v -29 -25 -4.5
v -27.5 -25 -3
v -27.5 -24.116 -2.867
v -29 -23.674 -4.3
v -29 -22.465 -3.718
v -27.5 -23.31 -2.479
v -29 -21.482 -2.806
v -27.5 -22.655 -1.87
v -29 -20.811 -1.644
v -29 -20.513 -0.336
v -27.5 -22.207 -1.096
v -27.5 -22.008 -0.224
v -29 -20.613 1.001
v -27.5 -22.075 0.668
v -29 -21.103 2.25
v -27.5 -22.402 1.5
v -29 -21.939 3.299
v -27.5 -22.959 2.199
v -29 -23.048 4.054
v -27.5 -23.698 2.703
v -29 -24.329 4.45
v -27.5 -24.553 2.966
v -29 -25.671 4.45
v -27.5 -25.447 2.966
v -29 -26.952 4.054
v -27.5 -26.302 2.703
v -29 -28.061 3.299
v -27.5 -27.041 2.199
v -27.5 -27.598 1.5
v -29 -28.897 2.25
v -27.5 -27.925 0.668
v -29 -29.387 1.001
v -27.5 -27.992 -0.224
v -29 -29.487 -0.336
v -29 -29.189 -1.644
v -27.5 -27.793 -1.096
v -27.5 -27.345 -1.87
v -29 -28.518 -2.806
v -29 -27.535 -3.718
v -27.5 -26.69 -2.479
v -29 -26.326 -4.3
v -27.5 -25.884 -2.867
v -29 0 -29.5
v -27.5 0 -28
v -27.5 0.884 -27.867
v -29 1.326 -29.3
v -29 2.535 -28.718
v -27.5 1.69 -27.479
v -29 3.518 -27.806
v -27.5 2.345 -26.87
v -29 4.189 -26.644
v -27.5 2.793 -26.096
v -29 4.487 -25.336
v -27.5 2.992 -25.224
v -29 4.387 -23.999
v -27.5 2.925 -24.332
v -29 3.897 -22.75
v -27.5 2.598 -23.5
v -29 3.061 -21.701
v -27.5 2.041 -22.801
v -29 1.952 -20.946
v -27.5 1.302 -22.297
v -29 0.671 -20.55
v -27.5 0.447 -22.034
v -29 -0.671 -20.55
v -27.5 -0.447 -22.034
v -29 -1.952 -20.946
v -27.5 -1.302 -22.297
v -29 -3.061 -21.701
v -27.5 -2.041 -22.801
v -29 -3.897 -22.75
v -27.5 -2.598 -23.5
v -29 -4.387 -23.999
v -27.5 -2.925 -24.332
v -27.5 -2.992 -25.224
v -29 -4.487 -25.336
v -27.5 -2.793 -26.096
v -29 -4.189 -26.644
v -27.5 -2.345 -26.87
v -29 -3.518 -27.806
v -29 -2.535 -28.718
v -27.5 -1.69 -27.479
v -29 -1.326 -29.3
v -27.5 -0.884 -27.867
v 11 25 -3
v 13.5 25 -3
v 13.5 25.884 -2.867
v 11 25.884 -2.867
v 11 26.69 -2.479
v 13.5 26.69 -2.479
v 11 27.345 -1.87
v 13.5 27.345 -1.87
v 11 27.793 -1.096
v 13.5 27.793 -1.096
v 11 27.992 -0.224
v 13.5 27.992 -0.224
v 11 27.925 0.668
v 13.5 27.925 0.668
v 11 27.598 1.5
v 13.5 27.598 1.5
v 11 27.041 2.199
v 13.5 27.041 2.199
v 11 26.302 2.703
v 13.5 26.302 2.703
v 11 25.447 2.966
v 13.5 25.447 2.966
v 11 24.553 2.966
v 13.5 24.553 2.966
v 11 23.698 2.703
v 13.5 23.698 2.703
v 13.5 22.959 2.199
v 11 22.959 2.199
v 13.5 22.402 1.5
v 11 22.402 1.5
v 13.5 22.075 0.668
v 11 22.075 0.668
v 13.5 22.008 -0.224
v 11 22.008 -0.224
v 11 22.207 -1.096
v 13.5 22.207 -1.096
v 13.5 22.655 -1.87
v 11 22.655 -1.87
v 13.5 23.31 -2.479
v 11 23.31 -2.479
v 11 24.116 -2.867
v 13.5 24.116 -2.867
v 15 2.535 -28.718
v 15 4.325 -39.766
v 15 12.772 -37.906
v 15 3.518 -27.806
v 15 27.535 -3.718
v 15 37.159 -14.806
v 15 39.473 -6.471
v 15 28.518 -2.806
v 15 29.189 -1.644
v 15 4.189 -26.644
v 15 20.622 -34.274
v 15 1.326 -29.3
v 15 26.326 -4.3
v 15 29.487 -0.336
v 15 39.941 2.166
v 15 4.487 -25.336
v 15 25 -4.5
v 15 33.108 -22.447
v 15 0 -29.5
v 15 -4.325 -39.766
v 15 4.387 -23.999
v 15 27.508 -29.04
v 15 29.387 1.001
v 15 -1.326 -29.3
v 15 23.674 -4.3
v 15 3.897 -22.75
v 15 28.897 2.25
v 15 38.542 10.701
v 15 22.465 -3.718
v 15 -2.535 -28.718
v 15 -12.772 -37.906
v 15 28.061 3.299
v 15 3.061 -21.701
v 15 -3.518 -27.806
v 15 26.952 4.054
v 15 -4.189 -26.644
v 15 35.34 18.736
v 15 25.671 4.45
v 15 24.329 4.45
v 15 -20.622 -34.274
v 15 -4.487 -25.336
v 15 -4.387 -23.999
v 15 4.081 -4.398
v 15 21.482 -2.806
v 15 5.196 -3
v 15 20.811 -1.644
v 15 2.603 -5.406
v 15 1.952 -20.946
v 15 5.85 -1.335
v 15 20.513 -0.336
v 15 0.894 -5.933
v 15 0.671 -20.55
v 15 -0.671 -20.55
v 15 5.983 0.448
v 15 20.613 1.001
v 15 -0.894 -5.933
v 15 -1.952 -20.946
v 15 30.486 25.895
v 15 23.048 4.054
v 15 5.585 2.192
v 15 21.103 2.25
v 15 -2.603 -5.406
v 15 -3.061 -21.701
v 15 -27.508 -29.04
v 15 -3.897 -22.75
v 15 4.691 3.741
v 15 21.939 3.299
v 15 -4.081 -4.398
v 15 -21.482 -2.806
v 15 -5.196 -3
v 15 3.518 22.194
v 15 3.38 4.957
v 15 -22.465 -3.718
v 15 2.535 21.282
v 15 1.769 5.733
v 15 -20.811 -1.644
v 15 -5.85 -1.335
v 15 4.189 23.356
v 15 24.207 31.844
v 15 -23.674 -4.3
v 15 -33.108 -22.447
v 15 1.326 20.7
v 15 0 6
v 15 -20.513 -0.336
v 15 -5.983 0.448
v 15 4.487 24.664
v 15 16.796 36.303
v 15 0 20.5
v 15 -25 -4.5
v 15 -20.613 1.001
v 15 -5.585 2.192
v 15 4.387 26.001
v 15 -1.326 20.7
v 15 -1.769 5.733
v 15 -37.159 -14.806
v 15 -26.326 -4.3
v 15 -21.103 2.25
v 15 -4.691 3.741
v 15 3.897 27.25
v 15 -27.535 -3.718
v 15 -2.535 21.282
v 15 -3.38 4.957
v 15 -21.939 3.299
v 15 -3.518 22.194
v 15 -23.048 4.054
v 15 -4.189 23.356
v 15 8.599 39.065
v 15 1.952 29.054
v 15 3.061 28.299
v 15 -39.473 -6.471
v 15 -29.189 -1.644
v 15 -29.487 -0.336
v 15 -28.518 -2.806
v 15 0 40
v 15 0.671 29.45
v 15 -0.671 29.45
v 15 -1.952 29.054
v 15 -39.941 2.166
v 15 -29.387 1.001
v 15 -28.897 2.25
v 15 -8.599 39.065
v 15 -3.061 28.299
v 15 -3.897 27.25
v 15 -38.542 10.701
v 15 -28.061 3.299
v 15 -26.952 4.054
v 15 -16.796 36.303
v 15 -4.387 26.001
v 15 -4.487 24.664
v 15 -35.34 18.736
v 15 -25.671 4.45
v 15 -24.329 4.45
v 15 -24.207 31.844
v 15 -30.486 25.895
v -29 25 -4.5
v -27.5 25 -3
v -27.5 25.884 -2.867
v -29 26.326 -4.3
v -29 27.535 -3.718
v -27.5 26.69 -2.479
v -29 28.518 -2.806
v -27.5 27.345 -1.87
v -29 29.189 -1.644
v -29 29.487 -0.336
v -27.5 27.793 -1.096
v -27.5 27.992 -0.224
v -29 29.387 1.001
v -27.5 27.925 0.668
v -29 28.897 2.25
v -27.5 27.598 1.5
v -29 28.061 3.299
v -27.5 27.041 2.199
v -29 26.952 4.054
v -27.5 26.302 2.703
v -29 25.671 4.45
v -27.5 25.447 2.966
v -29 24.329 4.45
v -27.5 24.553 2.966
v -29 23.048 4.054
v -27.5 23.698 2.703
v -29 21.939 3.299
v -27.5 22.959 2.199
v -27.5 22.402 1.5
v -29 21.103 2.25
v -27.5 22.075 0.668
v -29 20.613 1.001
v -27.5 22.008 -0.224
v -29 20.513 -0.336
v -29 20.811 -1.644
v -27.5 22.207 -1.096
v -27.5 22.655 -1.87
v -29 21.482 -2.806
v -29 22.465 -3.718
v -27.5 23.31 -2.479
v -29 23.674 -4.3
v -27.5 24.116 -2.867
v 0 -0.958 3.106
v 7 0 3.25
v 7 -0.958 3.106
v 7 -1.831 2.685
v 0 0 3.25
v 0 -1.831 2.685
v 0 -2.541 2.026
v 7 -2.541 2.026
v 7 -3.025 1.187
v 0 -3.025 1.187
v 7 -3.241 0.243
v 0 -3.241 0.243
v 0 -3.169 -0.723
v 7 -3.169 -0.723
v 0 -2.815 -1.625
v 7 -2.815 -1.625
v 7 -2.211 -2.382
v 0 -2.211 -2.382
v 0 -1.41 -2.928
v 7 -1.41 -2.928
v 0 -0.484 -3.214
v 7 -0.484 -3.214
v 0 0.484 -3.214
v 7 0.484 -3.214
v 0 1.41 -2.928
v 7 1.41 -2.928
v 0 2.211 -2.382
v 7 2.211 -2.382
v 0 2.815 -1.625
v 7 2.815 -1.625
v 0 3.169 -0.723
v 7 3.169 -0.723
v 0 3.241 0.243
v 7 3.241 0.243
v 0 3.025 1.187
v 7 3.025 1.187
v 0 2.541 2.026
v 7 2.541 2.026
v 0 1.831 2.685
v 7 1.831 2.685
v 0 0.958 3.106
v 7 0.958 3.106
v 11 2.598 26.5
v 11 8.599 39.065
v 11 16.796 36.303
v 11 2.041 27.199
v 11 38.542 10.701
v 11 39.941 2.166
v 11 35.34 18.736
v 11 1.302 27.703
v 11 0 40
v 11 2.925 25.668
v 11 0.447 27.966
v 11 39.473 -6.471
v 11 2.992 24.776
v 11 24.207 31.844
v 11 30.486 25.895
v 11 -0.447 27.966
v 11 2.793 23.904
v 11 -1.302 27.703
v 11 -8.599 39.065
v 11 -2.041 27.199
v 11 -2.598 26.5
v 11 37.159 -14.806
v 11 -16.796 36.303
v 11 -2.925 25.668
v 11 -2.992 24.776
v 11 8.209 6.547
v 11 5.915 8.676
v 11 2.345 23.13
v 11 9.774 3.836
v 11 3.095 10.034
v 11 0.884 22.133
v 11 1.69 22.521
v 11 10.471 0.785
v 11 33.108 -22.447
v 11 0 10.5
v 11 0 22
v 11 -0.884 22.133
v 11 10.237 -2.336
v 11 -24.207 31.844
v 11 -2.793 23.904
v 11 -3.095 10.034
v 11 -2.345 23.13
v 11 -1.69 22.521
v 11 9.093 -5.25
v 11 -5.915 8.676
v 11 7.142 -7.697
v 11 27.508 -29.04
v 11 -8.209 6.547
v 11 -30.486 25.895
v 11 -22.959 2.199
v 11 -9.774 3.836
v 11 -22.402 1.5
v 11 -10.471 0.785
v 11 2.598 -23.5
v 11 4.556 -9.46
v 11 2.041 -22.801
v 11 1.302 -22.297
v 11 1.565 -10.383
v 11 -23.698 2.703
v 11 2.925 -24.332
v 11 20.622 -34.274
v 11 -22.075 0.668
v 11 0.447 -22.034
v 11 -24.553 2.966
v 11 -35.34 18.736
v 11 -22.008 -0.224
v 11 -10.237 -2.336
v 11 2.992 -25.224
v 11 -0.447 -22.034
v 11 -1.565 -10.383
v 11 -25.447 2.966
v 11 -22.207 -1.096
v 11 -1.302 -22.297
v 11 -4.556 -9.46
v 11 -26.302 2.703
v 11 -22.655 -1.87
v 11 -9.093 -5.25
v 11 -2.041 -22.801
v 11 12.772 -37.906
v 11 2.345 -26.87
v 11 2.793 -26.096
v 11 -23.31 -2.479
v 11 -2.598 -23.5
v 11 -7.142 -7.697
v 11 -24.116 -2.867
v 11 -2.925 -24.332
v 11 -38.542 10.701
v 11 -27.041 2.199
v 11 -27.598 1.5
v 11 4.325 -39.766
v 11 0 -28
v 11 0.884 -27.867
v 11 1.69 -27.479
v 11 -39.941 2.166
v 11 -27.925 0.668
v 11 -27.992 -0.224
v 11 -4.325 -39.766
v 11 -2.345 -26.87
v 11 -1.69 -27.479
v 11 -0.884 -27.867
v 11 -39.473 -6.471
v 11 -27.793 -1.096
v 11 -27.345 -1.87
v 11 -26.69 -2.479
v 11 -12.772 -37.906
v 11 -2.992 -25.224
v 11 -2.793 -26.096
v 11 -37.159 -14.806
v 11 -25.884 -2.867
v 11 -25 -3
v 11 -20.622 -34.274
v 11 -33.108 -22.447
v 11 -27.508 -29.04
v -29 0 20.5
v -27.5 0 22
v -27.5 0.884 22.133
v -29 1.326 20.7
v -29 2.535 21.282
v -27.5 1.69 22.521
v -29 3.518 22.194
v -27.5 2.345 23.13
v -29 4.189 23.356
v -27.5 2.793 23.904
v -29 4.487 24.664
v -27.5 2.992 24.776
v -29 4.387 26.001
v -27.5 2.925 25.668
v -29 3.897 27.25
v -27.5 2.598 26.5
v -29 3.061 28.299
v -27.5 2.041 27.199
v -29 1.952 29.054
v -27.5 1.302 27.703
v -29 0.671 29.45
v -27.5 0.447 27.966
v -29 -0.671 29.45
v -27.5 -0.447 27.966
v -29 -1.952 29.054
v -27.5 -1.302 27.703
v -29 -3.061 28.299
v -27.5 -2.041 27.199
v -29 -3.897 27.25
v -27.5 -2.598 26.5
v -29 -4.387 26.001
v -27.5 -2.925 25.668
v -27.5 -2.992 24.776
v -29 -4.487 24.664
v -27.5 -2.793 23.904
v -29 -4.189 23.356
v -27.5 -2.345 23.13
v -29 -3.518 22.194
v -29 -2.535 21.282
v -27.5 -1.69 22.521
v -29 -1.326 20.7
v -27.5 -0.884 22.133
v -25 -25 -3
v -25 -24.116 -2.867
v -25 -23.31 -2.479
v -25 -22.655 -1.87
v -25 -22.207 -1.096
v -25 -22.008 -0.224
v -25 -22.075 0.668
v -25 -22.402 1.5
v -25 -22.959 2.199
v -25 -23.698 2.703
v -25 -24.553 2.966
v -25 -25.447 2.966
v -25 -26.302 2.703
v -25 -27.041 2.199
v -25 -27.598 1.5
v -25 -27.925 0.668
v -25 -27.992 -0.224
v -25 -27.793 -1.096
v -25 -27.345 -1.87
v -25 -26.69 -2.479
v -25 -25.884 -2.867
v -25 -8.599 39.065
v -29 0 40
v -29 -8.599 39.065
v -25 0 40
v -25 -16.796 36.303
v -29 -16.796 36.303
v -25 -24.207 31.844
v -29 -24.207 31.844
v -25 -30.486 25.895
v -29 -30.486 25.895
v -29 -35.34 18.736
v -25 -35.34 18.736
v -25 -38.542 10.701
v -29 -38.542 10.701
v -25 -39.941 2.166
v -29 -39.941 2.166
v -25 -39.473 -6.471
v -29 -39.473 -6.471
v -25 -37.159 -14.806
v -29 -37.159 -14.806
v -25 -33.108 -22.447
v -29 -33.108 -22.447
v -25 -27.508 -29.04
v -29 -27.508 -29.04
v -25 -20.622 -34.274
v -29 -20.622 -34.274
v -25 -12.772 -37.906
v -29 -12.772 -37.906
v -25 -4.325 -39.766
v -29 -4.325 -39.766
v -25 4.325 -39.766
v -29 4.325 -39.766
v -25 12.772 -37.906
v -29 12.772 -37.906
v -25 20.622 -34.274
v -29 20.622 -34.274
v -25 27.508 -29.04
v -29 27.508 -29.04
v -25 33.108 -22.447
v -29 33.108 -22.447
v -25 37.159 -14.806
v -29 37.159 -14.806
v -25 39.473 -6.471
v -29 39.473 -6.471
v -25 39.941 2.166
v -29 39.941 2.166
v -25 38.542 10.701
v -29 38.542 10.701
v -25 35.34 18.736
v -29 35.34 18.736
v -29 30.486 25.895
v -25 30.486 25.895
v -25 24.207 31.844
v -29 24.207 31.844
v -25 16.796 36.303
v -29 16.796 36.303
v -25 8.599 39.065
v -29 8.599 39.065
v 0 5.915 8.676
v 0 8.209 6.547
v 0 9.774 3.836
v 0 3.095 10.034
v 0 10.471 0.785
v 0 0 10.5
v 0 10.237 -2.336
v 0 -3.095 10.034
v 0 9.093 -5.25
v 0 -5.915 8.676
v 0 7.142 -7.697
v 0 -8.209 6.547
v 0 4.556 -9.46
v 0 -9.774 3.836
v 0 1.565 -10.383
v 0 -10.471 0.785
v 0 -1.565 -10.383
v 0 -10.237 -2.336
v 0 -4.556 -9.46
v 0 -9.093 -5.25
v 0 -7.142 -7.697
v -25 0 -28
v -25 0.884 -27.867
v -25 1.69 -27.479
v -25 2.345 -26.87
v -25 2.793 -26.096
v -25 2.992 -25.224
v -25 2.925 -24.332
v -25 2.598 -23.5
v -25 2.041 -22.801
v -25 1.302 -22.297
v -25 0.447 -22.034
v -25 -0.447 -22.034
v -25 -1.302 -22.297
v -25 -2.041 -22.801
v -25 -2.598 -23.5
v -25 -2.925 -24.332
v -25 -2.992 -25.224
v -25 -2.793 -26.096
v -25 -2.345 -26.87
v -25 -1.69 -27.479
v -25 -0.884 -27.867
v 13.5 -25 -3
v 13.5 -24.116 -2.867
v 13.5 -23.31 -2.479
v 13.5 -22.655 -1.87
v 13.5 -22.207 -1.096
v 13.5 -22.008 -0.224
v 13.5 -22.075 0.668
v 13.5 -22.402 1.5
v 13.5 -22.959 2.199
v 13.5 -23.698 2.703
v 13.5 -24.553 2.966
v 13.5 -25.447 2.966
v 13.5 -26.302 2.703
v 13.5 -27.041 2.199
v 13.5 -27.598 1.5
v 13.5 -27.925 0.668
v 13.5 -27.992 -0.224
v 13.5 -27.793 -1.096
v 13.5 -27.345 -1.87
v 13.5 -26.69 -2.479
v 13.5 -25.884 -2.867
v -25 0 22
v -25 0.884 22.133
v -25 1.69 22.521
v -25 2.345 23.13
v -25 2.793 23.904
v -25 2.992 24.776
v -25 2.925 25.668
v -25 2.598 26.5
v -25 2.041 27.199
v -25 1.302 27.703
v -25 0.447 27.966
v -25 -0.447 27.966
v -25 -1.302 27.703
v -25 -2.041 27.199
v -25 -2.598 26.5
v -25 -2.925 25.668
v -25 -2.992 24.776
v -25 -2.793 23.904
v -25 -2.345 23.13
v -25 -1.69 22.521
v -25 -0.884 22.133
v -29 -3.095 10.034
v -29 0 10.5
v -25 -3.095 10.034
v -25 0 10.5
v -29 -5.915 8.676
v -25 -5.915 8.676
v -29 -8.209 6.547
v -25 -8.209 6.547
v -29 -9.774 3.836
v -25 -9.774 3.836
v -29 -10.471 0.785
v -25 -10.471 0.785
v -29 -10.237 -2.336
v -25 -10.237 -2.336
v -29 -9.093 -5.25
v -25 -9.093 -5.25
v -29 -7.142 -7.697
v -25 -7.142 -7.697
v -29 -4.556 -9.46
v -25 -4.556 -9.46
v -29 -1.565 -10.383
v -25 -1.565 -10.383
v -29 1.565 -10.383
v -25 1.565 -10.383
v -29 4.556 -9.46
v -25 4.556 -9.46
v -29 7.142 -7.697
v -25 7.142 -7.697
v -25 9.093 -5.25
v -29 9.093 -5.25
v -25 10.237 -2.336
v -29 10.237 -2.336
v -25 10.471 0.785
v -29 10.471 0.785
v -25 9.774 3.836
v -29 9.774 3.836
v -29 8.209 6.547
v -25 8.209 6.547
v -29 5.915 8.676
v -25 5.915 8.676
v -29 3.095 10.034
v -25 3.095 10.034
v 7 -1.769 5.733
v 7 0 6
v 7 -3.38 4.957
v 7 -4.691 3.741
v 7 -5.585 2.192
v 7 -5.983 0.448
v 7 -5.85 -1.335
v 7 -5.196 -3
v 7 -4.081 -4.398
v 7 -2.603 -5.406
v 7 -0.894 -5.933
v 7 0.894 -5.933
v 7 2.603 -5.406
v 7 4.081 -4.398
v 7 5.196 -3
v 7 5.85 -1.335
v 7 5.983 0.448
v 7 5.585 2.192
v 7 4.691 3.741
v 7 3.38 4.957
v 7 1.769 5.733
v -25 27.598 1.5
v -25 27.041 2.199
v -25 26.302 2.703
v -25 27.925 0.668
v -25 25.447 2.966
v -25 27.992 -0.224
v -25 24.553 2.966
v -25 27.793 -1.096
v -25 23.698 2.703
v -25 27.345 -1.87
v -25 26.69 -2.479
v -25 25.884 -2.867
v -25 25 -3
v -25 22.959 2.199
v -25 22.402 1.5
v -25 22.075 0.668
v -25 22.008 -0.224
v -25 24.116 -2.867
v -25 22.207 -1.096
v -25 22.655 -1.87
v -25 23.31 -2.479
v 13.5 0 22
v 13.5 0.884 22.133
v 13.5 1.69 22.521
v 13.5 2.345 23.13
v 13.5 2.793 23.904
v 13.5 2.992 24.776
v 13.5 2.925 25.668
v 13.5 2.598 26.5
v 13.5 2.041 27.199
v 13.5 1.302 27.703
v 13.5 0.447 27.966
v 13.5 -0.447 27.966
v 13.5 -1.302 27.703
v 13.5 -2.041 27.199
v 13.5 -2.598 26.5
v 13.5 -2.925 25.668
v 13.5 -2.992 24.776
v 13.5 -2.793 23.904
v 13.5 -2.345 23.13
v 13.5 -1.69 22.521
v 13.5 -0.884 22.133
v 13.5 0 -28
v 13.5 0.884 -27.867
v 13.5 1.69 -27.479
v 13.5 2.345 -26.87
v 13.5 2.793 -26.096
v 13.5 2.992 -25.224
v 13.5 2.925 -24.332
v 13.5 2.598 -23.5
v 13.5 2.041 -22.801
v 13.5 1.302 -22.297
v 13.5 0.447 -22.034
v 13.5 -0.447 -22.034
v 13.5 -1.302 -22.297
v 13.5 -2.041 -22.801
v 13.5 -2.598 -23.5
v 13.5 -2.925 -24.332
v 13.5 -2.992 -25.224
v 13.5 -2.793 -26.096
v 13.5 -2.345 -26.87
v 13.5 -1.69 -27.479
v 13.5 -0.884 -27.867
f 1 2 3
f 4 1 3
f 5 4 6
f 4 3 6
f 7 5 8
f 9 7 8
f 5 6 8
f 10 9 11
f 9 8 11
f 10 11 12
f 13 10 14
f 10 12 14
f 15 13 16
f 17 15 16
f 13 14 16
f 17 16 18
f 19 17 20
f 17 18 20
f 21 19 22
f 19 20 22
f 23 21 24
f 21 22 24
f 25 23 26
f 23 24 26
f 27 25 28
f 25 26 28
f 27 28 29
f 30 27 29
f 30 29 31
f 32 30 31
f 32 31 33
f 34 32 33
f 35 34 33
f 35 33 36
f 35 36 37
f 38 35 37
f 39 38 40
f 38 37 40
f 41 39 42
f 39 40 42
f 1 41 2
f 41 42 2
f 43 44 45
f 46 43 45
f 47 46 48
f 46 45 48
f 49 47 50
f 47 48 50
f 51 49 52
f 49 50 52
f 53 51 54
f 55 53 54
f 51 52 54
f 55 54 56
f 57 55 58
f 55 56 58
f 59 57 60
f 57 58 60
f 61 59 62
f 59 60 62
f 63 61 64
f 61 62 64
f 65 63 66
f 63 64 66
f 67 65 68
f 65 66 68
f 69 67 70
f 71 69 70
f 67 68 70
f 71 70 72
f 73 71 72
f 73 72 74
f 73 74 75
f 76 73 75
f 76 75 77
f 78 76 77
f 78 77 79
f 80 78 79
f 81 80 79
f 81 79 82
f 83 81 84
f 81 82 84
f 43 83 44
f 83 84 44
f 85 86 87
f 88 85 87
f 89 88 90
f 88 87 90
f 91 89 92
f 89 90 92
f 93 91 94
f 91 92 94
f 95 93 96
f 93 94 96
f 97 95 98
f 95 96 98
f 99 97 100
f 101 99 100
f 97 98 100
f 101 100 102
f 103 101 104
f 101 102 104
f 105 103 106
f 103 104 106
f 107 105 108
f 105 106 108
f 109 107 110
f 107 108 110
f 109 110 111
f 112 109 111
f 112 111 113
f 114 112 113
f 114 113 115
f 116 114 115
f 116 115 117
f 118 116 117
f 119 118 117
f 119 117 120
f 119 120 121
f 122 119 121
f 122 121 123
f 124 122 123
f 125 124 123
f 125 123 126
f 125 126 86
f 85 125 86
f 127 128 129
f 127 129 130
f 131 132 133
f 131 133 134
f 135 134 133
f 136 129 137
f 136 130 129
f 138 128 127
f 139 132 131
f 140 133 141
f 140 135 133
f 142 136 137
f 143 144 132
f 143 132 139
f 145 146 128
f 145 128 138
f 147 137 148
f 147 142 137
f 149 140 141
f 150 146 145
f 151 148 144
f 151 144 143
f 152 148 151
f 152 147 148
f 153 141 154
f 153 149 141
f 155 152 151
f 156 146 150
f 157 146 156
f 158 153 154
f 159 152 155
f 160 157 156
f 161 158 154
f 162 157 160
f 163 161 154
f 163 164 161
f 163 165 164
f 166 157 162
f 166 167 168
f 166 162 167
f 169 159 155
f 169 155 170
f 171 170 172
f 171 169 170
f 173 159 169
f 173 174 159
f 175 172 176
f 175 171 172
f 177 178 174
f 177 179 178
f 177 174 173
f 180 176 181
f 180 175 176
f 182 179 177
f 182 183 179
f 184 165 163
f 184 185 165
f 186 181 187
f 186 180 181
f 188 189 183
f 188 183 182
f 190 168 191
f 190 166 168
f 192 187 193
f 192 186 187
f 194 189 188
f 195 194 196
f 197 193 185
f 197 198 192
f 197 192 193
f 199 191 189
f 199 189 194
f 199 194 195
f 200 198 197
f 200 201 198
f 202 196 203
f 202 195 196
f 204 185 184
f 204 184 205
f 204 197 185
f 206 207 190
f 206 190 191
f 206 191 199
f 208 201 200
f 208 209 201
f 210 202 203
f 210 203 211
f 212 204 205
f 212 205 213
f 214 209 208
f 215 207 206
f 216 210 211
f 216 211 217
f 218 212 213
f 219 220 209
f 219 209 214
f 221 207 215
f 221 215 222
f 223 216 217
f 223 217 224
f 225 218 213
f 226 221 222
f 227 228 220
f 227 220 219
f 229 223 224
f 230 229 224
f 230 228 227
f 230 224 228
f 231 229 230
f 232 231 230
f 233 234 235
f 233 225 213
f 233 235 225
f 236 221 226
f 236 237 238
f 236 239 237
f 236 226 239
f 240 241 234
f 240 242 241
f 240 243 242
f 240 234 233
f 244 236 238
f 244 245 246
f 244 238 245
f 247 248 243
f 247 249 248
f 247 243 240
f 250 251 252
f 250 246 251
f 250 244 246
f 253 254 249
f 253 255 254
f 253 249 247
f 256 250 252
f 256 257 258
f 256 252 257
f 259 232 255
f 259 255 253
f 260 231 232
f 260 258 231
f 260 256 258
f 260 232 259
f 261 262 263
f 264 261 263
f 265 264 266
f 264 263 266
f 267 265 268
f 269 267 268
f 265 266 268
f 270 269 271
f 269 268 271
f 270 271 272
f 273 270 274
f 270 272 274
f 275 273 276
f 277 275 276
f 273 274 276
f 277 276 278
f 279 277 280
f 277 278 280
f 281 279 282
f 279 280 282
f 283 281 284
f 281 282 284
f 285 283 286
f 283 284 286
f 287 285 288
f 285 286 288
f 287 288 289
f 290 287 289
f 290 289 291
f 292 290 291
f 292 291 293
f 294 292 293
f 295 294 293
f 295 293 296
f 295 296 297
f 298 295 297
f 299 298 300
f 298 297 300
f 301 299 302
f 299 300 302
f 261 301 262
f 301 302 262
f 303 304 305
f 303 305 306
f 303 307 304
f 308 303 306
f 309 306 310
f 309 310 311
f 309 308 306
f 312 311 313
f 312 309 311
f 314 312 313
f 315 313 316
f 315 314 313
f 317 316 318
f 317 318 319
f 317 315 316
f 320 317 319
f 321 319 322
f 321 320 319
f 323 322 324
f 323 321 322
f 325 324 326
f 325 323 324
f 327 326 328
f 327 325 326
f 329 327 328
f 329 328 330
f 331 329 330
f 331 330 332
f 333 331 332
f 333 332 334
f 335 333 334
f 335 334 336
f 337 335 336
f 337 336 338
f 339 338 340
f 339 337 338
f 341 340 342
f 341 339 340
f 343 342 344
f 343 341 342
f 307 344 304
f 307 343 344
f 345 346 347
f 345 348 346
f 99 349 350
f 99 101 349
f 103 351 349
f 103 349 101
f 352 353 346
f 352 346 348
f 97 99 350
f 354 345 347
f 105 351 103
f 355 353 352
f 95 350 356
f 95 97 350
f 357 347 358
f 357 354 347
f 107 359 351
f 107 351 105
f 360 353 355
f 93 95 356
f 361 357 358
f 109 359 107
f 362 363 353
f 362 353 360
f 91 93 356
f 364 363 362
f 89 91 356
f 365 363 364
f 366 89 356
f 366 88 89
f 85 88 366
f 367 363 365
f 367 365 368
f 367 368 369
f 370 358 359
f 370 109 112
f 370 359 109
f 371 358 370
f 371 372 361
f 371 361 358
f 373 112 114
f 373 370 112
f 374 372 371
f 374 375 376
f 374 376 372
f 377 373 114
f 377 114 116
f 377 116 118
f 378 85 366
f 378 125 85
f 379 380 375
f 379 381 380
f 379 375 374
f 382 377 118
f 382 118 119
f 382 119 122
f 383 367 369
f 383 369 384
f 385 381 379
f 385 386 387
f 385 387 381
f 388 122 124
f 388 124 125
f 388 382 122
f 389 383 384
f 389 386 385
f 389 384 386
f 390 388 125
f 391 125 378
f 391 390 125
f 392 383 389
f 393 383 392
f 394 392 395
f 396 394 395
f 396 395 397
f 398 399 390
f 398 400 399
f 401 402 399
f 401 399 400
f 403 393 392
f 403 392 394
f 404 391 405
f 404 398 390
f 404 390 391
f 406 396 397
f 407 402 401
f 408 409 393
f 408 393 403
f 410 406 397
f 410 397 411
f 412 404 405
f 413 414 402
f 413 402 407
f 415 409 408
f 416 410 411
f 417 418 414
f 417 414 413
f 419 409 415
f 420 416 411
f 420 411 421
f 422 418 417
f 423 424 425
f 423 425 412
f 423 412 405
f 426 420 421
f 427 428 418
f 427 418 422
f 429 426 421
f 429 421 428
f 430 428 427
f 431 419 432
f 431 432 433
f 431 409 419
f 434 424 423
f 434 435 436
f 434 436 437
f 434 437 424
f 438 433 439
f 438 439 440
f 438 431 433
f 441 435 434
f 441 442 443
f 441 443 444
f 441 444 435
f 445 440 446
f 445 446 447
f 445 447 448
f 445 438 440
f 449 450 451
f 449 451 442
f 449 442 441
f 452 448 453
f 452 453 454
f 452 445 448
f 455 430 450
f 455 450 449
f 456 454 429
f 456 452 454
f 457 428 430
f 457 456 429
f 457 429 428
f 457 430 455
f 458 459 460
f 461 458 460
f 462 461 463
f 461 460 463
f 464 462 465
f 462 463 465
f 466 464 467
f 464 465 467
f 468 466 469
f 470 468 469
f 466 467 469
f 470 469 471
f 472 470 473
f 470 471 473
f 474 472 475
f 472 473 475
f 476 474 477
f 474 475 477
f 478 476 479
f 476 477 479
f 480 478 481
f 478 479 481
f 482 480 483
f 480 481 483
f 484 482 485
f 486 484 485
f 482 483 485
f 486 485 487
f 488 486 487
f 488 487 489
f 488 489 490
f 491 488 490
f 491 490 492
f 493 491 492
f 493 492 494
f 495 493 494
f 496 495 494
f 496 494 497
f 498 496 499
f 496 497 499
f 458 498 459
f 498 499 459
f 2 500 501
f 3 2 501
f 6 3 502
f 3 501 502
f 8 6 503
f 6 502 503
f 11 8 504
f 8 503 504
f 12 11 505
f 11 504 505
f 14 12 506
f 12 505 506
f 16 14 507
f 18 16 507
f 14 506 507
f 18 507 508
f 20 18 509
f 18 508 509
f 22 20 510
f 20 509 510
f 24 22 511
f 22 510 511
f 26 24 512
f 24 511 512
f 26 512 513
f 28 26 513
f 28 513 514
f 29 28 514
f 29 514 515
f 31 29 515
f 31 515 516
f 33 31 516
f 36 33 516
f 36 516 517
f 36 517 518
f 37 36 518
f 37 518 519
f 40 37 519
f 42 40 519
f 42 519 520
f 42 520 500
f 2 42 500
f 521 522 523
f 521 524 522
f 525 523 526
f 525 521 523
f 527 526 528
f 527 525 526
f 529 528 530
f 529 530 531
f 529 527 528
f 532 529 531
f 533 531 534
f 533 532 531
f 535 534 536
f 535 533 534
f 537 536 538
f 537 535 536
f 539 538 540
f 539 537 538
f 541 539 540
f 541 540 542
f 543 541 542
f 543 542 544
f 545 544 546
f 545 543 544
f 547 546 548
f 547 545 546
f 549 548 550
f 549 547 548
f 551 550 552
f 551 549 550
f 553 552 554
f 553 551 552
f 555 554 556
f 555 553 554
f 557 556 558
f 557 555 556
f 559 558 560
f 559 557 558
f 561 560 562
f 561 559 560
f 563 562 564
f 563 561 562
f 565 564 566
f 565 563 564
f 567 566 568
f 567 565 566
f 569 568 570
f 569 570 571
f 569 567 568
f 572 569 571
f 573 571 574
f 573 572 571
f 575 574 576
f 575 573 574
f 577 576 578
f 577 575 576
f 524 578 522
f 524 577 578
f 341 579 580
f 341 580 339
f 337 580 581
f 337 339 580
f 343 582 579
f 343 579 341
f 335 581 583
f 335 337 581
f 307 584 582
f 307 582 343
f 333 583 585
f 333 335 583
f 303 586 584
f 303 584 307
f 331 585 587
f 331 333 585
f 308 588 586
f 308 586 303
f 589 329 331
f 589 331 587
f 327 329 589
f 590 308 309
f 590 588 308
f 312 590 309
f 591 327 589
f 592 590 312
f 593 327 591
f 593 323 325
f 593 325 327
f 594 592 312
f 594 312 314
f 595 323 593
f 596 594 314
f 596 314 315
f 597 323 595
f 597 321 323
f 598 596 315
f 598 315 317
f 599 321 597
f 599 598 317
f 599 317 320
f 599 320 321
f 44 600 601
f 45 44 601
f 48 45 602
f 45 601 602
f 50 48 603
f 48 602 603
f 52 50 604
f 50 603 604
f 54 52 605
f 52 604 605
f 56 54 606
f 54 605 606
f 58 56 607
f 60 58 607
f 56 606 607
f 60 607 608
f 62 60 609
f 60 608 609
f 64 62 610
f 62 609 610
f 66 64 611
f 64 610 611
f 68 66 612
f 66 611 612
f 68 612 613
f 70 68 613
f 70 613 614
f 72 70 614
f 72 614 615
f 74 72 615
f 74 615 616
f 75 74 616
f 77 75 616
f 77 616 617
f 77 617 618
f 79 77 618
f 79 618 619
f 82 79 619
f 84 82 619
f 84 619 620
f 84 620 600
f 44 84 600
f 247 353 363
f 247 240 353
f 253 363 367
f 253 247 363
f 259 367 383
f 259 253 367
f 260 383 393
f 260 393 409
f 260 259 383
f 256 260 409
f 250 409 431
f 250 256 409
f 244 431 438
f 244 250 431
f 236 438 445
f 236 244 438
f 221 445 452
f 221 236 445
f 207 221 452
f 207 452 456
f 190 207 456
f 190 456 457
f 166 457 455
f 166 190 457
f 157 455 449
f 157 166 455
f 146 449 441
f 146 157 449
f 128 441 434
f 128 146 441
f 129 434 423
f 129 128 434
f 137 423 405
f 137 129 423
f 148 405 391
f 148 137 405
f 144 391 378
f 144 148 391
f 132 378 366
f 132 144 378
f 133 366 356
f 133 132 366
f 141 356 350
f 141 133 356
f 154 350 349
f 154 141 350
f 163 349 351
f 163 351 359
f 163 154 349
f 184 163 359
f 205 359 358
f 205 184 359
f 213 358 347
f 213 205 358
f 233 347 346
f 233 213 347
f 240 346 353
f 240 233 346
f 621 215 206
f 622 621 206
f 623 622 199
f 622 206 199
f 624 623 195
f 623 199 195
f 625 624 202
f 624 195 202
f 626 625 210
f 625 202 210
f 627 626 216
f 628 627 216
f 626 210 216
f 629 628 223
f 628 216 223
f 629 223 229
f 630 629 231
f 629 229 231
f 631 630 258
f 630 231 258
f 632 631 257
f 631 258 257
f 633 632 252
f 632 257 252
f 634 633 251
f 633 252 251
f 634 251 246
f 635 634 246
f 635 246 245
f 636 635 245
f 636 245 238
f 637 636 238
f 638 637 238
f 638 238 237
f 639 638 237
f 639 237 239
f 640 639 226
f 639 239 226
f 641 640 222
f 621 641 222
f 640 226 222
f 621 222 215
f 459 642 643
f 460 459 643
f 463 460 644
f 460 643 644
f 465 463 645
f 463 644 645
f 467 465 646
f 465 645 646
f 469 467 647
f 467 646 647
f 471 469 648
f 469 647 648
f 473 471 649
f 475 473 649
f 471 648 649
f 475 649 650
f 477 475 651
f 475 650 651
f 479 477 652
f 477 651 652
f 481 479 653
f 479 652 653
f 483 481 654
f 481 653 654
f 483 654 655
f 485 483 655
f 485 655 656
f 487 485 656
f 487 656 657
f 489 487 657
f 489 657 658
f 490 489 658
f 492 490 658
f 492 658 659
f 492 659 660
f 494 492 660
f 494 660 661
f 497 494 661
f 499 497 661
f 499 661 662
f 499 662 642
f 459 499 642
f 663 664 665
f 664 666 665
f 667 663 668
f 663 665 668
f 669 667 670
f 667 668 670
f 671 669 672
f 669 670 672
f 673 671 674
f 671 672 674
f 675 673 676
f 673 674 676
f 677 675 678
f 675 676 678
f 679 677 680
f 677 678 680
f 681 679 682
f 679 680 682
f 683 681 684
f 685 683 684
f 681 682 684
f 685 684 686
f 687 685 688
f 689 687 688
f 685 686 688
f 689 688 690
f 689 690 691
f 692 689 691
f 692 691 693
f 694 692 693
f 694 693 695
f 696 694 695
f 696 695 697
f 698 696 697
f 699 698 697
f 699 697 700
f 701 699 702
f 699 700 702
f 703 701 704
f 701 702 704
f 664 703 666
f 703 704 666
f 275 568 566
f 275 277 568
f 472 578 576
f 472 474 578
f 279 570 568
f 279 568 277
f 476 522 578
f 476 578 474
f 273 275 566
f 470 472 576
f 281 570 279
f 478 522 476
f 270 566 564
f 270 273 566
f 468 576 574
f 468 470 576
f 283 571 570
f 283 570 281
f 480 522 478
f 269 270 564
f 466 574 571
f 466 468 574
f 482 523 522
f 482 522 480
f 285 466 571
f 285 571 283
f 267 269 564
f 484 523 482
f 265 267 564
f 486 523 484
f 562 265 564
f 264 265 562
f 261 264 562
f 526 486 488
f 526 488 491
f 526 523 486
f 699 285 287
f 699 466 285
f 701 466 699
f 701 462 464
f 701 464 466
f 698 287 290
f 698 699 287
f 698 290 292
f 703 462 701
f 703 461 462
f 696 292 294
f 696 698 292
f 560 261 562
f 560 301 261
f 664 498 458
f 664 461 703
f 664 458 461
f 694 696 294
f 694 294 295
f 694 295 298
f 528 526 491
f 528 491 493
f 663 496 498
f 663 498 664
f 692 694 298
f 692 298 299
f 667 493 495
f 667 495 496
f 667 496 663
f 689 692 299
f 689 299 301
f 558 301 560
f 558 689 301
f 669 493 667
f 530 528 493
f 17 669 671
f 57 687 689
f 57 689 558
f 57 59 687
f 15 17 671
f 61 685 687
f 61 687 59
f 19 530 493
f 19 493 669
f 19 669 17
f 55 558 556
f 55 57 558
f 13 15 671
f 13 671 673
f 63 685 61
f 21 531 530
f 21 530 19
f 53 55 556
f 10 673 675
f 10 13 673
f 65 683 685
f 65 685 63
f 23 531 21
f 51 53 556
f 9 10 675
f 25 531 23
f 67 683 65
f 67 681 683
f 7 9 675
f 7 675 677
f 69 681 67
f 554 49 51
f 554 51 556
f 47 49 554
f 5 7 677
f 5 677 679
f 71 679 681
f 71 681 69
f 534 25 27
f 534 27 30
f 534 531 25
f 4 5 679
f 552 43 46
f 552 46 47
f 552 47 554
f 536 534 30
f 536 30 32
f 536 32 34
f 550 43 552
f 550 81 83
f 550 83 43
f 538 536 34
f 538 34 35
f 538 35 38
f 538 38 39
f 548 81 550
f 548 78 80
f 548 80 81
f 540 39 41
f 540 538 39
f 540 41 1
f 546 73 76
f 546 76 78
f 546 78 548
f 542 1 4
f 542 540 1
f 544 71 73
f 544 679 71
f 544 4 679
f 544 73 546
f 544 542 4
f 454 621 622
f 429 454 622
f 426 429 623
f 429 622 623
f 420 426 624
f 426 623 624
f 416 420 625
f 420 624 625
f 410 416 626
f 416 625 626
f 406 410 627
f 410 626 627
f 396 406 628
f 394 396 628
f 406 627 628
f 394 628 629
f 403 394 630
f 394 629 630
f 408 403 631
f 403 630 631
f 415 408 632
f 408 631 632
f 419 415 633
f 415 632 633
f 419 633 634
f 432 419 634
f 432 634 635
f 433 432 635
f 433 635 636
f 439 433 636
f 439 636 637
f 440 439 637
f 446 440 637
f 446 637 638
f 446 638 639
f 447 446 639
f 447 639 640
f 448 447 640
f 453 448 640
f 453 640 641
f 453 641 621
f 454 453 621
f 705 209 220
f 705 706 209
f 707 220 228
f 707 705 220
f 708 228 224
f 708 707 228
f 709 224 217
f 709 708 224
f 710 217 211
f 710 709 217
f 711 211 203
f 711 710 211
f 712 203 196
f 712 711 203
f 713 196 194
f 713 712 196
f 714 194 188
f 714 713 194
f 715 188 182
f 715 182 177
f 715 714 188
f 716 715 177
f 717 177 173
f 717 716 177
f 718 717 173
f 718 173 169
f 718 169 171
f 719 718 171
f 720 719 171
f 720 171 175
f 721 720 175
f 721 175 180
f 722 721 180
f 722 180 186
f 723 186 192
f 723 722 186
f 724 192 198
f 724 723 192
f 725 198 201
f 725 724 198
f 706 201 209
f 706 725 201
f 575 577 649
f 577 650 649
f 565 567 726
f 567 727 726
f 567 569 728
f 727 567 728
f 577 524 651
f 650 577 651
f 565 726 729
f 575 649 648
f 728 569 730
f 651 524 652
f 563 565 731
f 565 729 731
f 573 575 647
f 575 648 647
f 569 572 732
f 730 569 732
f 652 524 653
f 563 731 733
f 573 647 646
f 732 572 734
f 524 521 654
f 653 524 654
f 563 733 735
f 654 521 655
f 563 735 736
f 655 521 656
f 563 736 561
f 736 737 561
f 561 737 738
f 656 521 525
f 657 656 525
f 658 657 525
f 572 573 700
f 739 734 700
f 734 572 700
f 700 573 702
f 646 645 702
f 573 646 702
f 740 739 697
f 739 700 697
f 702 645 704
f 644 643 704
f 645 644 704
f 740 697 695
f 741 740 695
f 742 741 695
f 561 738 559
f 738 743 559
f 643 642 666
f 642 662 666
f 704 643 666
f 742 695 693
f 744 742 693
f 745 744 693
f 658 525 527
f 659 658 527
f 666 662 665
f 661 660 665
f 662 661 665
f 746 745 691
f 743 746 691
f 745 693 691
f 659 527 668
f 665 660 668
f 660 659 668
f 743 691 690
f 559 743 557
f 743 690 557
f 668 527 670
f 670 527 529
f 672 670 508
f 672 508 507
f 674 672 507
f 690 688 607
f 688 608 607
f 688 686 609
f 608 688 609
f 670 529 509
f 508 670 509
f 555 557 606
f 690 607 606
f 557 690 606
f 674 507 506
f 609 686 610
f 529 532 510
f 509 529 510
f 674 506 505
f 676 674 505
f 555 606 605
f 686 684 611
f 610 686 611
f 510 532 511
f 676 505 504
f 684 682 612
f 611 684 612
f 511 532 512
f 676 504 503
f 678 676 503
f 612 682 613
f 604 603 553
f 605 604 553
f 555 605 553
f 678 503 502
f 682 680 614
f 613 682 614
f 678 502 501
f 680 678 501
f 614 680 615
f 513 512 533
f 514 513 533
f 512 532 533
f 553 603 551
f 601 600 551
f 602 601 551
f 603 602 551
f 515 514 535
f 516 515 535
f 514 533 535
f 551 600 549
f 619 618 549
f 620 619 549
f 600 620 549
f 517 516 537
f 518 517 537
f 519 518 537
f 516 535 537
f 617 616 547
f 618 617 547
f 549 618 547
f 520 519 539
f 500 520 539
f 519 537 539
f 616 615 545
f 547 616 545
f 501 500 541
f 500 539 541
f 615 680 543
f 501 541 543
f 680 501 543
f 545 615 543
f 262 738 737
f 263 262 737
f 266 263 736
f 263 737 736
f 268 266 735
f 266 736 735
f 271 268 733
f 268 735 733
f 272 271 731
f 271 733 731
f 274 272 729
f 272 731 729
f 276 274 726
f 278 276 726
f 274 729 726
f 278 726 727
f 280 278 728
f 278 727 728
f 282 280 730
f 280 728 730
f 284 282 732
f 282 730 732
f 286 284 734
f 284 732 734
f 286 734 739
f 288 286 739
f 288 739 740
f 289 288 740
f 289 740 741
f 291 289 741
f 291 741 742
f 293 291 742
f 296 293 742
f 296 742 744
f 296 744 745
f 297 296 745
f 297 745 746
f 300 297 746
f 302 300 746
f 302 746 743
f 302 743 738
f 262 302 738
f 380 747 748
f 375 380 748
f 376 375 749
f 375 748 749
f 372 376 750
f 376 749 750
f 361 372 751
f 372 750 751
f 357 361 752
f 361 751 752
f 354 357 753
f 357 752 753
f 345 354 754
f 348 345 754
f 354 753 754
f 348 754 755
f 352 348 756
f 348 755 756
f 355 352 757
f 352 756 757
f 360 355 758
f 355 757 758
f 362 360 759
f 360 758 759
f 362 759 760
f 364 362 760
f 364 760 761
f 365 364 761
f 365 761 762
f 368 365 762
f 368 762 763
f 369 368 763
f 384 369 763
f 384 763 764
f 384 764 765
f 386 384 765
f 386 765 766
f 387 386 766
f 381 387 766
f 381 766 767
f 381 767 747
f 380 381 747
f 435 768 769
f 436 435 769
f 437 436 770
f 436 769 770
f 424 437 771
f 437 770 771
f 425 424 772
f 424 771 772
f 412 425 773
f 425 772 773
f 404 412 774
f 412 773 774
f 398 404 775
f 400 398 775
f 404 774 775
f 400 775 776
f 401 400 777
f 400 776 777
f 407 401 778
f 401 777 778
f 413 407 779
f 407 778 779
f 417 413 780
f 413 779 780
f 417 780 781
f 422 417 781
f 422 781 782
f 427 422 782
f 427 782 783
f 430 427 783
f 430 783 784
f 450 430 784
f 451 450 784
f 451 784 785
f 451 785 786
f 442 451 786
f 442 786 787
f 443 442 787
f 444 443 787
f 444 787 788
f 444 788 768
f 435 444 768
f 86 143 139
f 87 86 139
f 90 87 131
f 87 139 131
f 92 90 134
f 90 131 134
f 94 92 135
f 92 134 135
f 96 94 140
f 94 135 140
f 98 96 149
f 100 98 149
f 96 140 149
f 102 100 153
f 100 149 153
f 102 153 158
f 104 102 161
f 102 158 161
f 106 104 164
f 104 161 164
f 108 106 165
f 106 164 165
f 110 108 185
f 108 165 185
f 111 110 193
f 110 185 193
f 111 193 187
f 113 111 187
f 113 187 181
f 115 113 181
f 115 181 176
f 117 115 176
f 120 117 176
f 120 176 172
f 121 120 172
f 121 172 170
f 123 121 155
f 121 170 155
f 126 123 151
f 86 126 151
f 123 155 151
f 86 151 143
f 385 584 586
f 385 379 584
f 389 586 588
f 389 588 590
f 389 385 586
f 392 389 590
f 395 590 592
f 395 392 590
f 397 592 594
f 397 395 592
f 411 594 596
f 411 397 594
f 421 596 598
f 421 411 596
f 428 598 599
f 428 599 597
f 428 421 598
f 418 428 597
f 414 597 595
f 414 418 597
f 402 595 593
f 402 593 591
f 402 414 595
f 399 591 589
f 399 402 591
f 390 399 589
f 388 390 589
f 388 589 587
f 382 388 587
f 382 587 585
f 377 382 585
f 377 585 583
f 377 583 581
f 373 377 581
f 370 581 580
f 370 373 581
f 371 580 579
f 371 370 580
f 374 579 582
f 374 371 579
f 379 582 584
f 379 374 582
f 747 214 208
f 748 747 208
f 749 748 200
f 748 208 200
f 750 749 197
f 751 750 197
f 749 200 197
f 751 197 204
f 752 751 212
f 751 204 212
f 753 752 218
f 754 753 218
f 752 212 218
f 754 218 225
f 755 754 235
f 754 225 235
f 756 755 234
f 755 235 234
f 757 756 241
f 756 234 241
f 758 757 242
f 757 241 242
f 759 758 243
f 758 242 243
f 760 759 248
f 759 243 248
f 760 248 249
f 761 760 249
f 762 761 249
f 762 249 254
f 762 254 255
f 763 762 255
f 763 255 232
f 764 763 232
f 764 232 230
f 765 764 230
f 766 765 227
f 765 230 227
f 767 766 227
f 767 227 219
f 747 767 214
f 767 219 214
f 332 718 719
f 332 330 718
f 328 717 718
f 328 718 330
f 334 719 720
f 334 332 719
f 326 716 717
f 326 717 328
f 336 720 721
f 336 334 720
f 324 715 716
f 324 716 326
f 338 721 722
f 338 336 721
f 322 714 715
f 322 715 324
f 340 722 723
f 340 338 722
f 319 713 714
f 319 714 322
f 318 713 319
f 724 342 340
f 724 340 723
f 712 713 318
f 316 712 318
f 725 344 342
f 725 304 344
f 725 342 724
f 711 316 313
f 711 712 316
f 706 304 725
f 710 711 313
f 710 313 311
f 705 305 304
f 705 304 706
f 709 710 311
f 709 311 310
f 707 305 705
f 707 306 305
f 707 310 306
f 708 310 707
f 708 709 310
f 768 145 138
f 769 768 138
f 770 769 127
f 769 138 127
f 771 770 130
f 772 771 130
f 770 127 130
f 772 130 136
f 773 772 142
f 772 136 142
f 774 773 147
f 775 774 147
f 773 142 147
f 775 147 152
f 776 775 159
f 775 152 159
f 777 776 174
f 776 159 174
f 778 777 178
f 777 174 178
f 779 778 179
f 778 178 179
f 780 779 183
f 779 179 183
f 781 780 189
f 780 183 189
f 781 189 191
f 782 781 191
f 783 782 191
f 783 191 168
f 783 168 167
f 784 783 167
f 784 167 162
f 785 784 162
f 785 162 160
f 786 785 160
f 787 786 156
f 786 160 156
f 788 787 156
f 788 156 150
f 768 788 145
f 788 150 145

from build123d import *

# Parameters (mm, degrees)
SKETCH1_W          = 4
SKETCH1_H          = 29.5
SKETCH2_R          = 3
CUT_EXTRUDE1_DEPTH = 72.665891469
CHAMFER1_SIZE      = 1.5
CHAMFER2_SIZE      = 1.5


with BuildPart() as part:
    # Sketch1 → Revolve1 (revolve)
    with BuildSketch(Plane.XY, mode=Mode.PRIVATE) as revolve1_sk:
        Polygon((0, 10.5), (11, 10.5), (11, 40), (15, 40), (15, 6), (7, 6), (7, 3.25), (0, 3.25), align=None)
        with Locations((-27, 25.25)):
            Rectangle(SKETCH1_W, SKETCH1_H)
    revolve(revolve1_sk.sketch.rotate(Axis((0, 0, 0), (1, 0, 0)), 90), axis=Axis((0, 0, 0), (1, 0, 0)))

    # Sketch2 → Cut-Extrude1 (cut, through all)
    with BuildSketch(Plane(origin=(15, 0, 0), x_dir=(0, 0, -1), z_dir=(1, 0, 0))):
        with Locations((25, 0)):
            Circle(SKETCH2_R)
        with Locations((0, -25)):
            Circle(SKETCH2_R)
        with Locations((-25, 0)):
            Circle(SKETCH2_R)
        with Locations((0, 25)):
            Circle(SKETCH2_R)
    extrude(amount=-CUT_EXTRUDE1_DEPTH, mode=Mode.SUBTRACT)

    # Chamfer1
    chamfer1_edges = [part.edges().sort_by_distance(p)[0] for p in [
        (15, 0, -22),
        (15, -25, 3),
        (15, 0, 28),
        (15, 25, 3),
    ]]
    chamfer(chamfer1_edges, length=CHAMFER1_SIZE)

    # Chamfer2
    chamfer2_edges = [part.edges().sort_by_distance(p)[0] for p in [
        (-29, 0, -22),
        (-29, -25, 3),
        (-29, 0, 28),
        (-29, 25, 3),
    ]]
    chamfer(chamfer2_edges, length=CHAMFER2_SIZE)


solid = part.part
